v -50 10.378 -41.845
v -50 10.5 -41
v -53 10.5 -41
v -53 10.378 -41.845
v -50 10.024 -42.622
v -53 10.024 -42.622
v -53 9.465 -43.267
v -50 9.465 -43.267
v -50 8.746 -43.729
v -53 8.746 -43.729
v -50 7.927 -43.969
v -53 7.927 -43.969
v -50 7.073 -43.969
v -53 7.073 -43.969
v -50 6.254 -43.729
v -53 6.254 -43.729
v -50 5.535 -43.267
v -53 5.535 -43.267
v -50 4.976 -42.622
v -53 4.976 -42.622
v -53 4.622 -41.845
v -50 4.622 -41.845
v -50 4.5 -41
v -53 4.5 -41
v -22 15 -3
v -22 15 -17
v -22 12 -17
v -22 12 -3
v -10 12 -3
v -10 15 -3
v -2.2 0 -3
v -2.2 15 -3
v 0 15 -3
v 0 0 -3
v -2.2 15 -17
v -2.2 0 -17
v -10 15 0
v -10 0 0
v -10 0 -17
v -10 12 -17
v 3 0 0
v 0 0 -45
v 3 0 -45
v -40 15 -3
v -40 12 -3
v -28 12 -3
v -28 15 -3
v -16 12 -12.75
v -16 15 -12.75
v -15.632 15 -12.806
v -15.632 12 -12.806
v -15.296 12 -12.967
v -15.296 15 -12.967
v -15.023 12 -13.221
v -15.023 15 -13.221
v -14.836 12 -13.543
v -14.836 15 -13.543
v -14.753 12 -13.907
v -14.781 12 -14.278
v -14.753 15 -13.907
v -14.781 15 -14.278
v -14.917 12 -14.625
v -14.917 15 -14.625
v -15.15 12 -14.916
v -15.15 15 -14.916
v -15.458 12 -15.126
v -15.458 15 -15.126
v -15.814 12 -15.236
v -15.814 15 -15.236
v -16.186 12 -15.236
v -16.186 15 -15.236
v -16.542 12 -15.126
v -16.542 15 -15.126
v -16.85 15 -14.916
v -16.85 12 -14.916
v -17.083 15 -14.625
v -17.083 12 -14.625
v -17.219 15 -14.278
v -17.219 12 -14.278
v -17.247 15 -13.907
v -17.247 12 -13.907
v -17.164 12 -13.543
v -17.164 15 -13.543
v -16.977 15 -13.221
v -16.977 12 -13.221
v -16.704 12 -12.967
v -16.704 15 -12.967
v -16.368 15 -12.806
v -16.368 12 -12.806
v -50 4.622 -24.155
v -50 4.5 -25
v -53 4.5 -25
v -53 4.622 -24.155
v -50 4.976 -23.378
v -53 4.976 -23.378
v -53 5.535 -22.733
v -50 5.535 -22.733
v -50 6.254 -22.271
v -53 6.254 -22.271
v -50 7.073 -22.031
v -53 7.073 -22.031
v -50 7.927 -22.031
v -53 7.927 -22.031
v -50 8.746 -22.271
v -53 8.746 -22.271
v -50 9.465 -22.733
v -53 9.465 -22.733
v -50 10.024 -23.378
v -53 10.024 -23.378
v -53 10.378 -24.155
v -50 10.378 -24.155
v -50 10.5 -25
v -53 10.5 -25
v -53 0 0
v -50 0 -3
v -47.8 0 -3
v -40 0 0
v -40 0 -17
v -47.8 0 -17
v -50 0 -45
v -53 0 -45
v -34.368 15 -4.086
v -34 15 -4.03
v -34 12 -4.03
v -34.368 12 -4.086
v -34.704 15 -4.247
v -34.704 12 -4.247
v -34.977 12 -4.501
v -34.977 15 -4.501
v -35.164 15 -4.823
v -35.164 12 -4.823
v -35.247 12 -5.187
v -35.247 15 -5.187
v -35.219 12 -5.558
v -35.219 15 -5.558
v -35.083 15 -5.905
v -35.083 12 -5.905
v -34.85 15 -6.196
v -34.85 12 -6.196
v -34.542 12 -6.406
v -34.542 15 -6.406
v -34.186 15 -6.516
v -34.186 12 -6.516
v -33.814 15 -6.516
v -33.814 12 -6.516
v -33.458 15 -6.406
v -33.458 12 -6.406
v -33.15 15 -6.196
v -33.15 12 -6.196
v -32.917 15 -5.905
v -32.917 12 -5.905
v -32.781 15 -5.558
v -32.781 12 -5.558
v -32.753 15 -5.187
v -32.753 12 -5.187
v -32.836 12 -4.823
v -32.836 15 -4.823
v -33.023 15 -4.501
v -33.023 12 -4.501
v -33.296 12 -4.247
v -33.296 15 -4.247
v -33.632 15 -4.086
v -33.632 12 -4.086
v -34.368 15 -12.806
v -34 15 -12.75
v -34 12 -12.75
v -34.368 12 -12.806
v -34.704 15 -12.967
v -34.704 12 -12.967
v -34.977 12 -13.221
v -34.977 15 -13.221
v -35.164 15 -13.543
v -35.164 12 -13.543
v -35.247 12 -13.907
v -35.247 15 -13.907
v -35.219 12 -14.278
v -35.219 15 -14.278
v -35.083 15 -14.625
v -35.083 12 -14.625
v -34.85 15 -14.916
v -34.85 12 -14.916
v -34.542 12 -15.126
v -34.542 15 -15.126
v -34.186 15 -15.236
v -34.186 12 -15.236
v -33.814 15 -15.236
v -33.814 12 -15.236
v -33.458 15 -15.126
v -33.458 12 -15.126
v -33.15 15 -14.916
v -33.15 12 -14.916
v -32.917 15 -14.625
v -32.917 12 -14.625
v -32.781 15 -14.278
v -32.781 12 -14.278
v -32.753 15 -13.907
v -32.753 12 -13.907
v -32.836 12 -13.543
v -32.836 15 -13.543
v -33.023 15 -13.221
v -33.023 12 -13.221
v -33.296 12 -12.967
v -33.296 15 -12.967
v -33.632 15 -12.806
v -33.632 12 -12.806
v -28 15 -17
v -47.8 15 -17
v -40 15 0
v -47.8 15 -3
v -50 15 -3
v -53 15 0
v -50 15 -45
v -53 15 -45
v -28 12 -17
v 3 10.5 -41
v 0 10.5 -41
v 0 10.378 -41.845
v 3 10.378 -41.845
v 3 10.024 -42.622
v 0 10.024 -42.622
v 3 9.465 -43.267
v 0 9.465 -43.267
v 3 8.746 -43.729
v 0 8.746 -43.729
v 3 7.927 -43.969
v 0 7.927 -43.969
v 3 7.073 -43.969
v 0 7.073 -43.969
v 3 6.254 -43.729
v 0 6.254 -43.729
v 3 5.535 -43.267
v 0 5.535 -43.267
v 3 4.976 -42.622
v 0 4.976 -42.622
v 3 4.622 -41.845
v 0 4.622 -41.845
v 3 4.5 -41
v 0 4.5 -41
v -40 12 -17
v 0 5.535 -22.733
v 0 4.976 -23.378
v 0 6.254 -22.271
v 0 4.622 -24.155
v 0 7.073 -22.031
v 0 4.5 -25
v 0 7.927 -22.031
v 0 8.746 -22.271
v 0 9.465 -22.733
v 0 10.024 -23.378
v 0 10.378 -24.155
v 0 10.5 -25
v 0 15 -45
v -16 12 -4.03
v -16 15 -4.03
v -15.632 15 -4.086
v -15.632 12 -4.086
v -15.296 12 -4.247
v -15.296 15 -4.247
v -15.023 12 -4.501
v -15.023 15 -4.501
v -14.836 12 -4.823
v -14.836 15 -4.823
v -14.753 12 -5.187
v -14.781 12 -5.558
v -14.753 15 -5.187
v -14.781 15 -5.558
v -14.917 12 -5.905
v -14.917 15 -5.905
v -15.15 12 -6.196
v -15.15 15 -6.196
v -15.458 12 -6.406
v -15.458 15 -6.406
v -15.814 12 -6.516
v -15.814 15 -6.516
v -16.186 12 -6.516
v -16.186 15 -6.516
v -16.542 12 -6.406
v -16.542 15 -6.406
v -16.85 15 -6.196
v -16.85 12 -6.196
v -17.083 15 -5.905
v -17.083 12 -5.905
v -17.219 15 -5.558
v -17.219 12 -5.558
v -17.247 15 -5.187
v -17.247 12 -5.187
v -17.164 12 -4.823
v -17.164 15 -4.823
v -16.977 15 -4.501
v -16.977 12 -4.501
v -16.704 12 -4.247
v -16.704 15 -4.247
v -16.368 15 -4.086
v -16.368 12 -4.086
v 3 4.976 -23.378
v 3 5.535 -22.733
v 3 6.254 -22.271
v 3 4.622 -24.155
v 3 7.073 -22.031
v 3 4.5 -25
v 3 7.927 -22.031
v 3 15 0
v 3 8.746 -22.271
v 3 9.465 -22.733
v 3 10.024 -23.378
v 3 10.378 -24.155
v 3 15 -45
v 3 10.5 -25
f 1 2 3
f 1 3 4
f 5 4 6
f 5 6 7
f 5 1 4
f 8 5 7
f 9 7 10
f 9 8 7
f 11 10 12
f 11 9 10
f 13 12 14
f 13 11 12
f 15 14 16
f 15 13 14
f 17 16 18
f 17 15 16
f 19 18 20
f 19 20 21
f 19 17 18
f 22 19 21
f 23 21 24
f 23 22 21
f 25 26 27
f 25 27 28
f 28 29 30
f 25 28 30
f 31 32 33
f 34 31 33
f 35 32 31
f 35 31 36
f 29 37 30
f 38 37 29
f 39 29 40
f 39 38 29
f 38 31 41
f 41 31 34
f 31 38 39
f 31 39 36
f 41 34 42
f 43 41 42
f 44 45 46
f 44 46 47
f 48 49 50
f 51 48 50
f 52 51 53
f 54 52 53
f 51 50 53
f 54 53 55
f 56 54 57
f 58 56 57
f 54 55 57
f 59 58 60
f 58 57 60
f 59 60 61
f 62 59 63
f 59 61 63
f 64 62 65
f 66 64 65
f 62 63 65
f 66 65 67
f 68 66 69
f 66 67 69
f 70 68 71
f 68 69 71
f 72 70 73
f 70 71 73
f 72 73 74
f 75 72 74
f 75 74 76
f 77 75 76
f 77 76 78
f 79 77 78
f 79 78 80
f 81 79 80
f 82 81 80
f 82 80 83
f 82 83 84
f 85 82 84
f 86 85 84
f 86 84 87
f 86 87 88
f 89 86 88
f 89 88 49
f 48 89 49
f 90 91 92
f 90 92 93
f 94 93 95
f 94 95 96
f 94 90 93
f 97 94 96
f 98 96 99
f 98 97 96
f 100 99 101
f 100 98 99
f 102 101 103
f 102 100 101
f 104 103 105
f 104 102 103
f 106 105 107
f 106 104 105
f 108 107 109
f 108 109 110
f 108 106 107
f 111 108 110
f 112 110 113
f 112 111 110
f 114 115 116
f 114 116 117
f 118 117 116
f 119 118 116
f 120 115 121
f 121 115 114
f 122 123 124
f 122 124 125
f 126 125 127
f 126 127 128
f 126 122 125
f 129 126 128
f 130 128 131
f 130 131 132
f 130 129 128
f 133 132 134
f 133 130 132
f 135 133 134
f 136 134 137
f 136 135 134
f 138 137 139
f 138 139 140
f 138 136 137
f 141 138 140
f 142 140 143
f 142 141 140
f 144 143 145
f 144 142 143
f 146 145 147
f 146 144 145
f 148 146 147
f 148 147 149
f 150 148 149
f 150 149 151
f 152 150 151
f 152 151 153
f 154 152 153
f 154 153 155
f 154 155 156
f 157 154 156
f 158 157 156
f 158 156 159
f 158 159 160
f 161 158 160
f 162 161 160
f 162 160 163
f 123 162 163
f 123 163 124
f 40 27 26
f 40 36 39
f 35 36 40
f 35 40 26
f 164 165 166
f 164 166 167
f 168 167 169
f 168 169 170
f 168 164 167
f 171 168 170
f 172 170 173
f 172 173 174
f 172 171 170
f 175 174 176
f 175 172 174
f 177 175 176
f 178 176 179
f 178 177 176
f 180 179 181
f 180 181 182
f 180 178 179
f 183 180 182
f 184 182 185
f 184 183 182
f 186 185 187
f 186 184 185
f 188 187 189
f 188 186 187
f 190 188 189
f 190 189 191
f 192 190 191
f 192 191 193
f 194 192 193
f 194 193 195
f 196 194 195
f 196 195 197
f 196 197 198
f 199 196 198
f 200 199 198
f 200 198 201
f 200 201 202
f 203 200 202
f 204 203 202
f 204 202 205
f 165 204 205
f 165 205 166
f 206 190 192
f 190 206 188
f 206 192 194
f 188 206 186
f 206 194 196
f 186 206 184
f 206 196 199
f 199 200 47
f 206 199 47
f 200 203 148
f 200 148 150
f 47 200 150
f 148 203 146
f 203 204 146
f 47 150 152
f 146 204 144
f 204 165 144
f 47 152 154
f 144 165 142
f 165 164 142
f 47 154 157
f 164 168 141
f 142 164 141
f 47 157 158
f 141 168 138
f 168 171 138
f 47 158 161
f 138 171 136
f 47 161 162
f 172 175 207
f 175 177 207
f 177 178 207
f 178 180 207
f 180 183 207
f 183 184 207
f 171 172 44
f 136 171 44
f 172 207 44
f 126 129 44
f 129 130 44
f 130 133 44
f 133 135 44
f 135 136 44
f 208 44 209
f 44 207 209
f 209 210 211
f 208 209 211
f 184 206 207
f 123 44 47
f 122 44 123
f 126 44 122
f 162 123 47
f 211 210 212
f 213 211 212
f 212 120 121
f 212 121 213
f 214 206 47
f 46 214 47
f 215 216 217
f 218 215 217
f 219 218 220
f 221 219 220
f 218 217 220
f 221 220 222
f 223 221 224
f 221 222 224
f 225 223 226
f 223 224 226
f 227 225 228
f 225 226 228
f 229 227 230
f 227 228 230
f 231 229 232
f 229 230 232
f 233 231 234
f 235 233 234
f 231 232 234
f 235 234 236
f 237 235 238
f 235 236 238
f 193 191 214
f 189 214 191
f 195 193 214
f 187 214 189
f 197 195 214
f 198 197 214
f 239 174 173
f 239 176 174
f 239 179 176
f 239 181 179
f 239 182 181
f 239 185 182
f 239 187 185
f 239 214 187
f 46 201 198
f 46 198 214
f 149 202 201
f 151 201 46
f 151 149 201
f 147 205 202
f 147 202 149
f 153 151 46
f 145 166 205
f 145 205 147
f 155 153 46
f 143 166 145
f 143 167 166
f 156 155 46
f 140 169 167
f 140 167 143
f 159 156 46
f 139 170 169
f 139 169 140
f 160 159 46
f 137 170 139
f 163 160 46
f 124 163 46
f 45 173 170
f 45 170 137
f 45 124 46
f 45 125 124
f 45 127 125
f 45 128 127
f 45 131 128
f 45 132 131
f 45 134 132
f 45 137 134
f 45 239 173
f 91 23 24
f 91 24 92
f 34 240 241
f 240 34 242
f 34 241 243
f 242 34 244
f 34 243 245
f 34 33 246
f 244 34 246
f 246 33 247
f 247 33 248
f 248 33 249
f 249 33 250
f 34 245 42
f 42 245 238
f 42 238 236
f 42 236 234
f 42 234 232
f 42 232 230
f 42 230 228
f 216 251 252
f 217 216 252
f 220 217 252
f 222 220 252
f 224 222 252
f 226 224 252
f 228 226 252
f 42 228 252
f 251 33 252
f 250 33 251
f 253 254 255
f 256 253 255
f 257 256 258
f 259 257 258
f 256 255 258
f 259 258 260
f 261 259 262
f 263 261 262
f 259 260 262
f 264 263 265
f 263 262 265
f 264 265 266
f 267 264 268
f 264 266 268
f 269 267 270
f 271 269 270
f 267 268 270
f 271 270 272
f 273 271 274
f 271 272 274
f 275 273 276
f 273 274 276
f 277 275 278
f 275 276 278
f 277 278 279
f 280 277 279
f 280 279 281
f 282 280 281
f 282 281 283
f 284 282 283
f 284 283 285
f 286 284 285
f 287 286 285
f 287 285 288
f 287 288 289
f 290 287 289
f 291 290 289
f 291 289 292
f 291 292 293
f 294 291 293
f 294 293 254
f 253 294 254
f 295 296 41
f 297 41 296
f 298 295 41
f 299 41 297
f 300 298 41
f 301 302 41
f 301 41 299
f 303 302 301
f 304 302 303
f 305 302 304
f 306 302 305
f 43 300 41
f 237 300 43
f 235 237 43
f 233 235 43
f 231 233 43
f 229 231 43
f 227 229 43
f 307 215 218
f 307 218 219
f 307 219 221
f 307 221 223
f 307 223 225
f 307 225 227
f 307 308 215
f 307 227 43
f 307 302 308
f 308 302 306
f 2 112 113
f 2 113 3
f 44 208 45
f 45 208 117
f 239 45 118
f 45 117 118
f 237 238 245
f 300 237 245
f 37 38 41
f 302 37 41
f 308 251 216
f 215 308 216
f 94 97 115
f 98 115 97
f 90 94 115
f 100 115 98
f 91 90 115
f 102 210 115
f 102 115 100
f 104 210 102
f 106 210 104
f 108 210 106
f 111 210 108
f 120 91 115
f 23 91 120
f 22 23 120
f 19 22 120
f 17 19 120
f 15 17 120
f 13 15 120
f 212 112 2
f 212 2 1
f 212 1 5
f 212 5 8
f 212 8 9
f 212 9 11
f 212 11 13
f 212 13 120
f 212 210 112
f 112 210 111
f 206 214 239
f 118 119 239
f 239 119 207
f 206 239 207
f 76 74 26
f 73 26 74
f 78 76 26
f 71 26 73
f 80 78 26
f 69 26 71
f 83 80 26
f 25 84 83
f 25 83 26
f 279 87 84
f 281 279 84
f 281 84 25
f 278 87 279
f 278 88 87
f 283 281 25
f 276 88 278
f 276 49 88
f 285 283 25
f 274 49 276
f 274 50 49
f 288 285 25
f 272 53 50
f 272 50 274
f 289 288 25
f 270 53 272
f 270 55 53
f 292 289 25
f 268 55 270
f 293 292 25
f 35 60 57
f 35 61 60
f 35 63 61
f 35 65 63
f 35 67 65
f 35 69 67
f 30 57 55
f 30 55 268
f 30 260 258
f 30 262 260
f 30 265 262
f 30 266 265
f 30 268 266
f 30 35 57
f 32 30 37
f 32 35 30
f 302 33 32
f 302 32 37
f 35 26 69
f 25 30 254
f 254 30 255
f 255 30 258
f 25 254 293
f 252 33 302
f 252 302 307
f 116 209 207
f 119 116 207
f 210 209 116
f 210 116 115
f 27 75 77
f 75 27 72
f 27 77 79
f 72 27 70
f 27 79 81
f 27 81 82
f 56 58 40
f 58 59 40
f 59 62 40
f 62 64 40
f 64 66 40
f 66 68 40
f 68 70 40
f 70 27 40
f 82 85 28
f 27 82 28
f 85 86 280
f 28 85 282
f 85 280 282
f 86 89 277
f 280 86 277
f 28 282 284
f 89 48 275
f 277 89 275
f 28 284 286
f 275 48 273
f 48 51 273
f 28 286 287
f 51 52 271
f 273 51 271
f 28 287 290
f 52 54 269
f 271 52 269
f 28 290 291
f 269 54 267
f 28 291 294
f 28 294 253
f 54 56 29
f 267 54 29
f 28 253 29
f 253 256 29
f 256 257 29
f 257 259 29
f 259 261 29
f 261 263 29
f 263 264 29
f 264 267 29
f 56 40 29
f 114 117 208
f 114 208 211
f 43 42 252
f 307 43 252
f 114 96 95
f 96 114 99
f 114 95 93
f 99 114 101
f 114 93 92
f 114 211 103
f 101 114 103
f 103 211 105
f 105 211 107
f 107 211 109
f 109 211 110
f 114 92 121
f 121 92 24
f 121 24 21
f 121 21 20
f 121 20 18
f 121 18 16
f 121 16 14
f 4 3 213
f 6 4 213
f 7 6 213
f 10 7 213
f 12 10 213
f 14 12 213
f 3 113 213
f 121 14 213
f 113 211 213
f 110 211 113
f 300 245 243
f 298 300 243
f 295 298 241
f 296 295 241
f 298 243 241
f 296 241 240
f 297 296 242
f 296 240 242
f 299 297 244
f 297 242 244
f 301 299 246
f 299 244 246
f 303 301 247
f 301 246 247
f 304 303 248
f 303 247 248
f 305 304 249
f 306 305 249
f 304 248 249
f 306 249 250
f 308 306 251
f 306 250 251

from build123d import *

# Parameters (mm, degrees)
SKETCH1_W                   = 45
SKETCH1_H                   = 15
MOUNTS_TO_CNC_DEPTH         = 3
SKETCH2_W                   = 10
SKETCH2_H                   = 17
WRAP_AROUND_DEPTH           = 15
SPACE_FOR_STEEL_REACH       = 50.477
SKETCH4_W                   = 2.2
SKETCH4_H                   = 42
SKETCH5_W                   = 14
SKETCH5_H                   = 3
LEVEL_SWITCH_PLATFORM_DEPTH = 12
SWITCH_MOUNT_HOLES_REACH    = 54.288
SKETCH7_R                   = 1.25


with BuildPart() as part:
    # Sketch1 → mounts_to_cnc (new body)
    with BuildSketch(Plane(origin=(0, 0, 0), x_dir=(0, 0, -1), z_dir=(1, 0, 0))):
        with Locations((22.5, 7.5)):
            Rectangle(SKETCH1_W, SKETCH1_H)
        with BuildLine():
            Line((41, 4.5), (25, 4.5))
            ThreePointArc((25, 4.5), (22, 7.5), (25, 10.5))
            Line((25, 10.5), (41, 10.5))
            ThreePointArc((41, 10.5), (44, 7.5), (41, 4.5))
        make_face(mode=Mode.SUBTRACT)
    extrude(amount=MOUNTS_TO_CNC_DEPTH)

    # Sketch2 → wrap_around (add)
    with BuildSketch(Plane(origin=(0, 0, 0), x_dir=(1, 0, 0), z_dir=(0, 1, 0))):
        with Locations((-5, 8.5)):
            Rectangle(SKETCH2_W, SKETCH2_H)
    extrude(amount=WRAP_AROUND_DEPTH)

    # Sketch4 → space_for_steel (cut, up to next)
    with BuildSketch(Plane(origin=(0, 15, 0), x_dir=(1, 0, 0), z_dir=(0, 1, 0)), mode=Mode.PRIVATE) as space_for_steel_sk1:
        with Locations((-1.1, 24)):
            Rectangle(SKETCH4_W, SKETCH4_H)
    space_for_steel_tool1 = extrude(space_for_steel_sk1.sketch, amount=-SPACE_FOR_STEEL_REACH, mode=Mode.PRIVATE) & part.part
    add(space_for_steel_tool1.solids().sort_by_distance((-1.1, 15, -24))[0], mode=Mode.SUBTRACT)

    # Sketch5 → level_switch_platform (add)
    with BuildSketch(Plane.ZY.offset(10)):
        with Locations((-10, 13.5)):
            Rectangle(SKETCH5_W, SKETCH5_H)
    extrude(amount=LEVEL_SWITCH_PLATFORM_DEPTH)

    # Sketch7 → switch_mount_holes (cut, up to next)
    with BuildSketch(Plane(origin=(0, 15, 0), x_dir=(1, 0, 0), z_dir=(0, 1, 0)), mode=Mode.PRIVATE) as switch_mount_holes_sk1:
        with Locations(Location((-16, 14, 0), (0, 0, 270))):
            Circle(SKETCH7_R)
    switch_mount_holes_tool1 = extrude(switch_mount_holes_sk1.sketch, amount=-SWITCH_MOUNT_HOLES_REACH, mode=Mode.PRIVATE) & part.part
    # Sketch7 → switch_mount_holes (cut, up to next)
    with BuildSketch(Plane(origin=(0, 15, 0), x_dir=(1, 0, 0), z_dir=(0, 1, 0)), mode=Mode.PRIVATE) as switch_mount_holes_sk2:
        with Locations(Location((-16, 5.28, 0), (0, 0, 270))):
            Circle(SKETCH7_R)
    switch_mount_holes_tool2 = extrude(switch_mount_holes_sk2.sketch, amount=-SWITCH_MOUNT_HOLES_REACH, mode=Mode.PRIVATE) & part.part
    add(switch_mount_holes_tool1.solids().sort_by_distance((-16, 15, -14))[0], mode=Mode.SUBTRACT)
    add(switch_mount_holes_tool2.solids().sort_by_distance((-16, 15, -5.28))[0], mode=Mode.SUBTRACT)


with BuildPart() as body_2:
    # chiarity_copy: mirrored copy
    add(part.part.mirror(Plane.ZY.offset(25)))


solid = Compound([part.part, body_2.part])
